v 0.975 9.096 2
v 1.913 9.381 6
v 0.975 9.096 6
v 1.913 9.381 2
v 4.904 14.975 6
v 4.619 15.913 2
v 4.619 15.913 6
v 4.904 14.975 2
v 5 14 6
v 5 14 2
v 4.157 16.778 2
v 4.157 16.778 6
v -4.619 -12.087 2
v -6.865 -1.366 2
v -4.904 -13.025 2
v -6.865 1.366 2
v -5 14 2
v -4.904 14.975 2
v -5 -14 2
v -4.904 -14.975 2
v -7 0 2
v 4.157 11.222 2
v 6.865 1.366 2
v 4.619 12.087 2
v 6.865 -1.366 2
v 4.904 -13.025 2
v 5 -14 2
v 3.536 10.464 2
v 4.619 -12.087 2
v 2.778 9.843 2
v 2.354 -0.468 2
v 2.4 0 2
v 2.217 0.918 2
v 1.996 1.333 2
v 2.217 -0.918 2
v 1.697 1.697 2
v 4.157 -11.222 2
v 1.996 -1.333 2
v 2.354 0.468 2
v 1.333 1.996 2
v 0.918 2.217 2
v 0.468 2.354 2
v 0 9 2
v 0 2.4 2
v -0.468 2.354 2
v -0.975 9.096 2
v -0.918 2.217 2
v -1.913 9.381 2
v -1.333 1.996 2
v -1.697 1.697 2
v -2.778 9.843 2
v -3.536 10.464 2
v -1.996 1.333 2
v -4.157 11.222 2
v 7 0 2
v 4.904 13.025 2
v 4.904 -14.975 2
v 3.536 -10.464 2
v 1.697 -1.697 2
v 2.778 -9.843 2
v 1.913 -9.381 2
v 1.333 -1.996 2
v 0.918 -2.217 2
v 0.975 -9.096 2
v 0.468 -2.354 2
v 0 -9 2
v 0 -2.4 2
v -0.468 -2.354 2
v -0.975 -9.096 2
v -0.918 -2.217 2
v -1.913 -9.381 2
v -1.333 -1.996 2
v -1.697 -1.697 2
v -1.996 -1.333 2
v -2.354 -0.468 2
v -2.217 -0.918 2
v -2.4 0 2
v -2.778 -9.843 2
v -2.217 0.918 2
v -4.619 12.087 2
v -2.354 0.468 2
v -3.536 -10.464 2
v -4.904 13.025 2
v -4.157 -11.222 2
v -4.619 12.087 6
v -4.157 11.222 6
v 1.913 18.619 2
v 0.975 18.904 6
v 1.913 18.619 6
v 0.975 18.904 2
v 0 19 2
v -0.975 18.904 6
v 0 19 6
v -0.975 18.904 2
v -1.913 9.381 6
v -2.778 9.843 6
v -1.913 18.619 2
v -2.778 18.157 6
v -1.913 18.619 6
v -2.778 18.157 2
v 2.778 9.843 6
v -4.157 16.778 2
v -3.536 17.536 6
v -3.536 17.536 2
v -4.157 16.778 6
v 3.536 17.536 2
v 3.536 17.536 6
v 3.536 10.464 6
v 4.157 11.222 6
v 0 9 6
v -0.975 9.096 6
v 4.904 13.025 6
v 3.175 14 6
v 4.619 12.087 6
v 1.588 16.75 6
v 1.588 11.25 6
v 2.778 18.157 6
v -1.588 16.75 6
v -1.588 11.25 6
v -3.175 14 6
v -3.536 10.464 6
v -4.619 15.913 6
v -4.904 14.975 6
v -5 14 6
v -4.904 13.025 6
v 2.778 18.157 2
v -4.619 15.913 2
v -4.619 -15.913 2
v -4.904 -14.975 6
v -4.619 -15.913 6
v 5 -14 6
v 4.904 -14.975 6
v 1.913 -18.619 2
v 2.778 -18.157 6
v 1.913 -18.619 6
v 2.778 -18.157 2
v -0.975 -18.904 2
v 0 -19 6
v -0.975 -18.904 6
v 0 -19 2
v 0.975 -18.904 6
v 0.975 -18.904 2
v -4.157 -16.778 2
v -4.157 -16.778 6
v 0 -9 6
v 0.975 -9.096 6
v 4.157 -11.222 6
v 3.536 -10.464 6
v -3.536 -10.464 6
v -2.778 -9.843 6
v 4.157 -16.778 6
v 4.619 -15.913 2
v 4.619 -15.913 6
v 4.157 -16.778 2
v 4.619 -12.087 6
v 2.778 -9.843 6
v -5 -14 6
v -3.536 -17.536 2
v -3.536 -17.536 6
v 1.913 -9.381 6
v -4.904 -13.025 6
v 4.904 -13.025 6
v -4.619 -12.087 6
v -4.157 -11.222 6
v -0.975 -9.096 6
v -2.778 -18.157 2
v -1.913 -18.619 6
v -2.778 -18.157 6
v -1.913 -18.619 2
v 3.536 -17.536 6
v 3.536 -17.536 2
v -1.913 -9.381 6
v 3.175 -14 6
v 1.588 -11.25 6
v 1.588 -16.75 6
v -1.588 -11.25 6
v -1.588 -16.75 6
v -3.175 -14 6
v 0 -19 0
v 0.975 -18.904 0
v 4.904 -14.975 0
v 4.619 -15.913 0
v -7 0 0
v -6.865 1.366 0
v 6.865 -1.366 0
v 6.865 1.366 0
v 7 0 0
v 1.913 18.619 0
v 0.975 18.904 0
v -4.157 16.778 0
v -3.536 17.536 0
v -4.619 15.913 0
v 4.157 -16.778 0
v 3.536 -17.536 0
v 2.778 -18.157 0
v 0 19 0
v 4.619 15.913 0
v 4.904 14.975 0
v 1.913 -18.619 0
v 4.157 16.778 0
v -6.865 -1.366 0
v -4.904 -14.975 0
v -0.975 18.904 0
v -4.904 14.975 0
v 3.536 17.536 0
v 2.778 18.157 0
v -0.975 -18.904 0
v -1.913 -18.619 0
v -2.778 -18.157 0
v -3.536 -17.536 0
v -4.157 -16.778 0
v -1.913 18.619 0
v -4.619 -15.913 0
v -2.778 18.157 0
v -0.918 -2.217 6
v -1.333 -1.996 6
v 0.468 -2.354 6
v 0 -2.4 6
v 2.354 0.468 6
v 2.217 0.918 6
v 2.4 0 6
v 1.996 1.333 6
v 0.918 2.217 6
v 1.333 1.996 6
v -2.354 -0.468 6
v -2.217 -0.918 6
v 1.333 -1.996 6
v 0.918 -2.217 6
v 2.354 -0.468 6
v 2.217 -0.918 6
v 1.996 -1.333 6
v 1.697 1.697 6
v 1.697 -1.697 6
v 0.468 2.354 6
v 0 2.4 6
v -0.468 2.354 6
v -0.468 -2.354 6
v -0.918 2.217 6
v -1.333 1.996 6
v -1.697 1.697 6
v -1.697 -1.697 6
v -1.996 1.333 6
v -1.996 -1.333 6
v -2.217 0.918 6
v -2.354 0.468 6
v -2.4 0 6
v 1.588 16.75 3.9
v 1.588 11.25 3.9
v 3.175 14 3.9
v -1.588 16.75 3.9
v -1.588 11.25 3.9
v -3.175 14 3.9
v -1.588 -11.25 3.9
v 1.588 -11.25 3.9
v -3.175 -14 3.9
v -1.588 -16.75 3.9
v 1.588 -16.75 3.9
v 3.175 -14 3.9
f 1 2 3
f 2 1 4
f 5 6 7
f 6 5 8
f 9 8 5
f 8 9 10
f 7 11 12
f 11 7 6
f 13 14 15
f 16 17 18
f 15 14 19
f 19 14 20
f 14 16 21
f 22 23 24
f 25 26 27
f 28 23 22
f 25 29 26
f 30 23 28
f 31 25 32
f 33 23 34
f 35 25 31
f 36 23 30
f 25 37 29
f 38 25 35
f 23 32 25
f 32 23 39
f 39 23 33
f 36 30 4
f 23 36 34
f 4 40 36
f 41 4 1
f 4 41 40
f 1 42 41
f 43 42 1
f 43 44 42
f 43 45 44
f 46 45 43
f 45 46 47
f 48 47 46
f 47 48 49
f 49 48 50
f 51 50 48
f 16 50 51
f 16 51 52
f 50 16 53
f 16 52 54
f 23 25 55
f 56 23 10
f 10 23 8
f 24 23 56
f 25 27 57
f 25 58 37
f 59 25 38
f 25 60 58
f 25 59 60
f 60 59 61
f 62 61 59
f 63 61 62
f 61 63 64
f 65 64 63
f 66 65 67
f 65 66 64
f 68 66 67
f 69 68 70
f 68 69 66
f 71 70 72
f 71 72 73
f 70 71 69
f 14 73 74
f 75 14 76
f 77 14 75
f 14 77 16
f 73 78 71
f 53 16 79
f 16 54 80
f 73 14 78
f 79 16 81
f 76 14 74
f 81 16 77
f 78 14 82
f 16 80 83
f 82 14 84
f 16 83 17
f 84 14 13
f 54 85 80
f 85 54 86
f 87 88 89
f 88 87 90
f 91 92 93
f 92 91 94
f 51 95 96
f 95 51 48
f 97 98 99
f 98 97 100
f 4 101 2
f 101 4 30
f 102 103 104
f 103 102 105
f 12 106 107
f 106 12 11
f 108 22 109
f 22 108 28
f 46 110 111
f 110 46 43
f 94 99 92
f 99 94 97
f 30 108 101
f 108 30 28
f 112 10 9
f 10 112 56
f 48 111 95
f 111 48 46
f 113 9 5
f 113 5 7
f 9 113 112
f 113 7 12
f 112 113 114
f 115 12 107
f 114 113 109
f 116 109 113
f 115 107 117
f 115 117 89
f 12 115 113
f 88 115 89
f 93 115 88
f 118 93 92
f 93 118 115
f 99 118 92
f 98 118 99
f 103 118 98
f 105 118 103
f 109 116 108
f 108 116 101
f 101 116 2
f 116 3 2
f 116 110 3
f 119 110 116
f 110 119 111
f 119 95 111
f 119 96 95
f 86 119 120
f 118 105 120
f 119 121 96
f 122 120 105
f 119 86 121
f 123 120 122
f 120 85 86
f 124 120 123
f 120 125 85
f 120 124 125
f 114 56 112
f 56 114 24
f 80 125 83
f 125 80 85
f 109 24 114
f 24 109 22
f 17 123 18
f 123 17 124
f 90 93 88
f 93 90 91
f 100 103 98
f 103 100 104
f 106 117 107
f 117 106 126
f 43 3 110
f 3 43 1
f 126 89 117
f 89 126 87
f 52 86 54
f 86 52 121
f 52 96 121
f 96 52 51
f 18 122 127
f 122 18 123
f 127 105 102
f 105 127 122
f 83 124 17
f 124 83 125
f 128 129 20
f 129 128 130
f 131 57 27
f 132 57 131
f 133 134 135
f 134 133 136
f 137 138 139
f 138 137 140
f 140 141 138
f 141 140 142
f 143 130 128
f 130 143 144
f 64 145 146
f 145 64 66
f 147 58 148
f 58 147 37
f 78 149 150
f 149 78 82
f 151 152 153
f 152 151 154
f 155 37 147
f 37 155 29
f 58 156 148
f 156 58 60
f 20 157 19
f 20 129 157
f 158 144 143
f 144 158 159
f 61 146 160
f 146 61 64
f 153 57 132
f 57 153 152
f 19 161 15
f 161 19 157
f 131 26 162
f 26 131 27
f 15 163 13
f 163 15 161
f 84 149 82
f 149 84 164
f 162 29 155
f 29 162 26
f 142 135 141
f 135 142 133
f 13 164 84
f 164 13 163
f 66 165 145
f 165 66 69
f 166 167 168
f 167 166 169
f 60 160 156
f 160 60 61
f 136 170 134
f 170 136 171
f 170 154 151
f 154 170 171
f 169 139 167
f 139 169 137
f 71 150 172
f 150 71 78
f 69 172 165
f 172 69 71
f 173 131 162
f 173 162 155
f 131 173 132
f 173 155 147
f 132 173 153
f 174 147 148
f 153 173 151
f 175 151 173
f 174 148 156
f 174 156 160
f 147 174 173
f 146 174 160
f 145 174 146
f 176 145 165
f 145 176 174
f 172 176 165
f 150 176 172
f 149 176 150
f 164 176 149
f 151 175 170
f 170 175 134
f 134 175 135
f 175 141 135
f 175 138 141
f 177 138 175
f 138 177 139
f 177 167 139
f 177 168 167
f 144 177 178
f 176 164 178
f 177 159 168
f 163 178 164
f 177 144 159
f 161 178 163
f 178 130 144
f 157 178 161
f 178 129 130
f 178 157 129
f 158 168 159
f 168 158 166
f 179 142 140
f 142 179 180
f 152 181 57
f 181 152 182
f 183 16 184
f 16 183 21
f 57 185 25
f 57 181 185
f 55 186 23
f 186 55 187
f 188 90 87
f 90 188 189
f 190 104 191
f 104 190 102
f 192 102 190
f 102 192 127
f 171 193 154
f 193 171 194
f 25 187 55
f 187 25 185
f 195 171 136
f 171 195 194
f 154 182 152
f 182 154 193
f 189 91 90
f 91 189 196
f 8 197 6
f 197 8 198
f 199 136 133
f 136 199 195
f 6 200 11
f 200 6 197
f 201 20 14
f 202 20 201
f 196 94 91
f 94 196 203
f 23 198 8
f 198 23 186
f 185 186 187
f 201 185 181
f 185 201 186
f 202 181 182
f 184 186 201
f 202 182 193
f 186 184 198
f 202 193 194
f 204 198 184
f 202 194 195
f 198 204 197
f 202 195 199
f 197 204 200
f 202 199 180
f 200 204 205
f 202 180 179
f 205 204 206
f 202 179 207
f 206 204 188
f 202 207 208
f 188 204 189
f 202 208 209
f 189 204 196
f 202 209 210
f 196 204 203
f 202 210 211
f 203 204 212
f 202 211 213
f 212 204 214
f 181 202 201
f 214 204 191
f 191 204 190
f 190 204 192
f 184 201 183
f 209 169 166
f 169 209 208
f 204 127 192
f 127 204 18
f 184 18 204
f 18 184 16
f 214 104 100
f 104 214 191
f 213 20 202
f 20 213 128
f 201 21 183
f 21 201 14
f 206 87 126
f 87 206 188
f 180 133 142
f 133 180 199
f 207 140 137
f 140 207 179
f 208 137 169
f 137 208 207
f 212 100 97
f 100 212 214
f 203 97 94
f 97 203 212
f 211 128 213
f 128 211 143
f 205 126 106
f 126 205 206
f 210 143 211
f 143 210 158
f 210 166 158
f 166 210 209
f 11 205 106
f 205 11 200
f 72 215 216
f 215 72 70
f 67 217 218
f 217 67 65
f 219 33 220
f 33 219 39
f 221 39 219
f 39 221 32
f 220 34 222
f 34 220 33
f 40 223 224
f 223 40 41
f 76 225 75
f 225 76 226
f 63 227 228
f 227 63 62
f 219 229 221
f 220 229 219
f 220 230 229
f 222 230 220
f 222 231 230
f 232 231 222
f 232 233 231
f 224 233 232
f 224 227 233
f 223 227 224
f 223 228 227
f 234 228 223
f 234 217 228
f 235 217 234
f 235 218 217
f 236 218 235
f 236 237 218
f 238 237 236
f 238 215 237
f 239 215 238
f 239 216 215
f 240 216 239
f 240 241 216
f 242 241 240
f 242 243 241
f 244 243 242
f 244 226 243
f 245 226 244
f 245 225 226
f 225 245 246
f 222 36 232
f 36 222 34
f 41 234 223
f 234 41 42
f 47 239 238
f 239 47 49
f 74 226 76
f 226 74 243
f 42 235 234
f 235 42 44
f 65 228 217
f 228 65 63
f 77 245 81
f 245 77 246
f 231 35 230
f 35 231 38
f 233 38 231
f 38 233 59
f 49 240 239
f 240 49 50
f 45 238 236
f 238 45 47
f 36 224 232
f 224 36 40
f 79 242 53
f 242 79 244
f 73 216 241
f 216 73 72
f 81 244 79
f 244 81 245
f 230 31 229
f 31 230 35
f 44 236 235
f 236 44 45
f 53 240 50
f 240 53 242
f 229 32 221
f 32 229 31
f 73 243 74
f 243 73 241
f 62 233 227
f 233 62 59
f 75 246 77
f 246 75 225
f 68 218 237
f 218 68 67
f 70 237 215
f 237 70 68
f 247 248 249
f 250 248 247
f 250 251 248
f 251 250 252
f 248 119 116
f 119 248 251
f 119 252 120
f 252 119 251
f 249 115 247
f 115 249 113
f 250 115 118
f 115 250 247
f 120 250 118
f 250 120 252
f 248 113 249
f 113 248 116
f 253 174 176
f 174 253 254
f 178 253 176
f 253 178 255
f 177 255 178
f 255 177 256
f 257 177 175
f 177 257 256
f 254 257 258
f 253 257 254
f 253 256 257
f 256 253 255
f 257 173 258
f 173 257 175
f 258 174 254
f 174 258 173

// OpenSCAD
// file: oem/generic/third_party/shortcuts.scad
// ShortCuts.scad 
// Autor: Rudolf Huttary, Berlin 2015
//
$fn = 100; 


//show_examples(); 

module show_examples()
	place_in_rect(30, 30)
	{
		Cy(h = 10); 
		CyH(h = 10); 
		CyH(h = 10, w = 30); 
		CyS(h = 10); 
		CyS(h = 10, w1 = 25, w2 = 75); 
		Cu(10); 
		Ri(h = 10); 
		RiH(h = 10); 
		RiS(h = 10, w1 = 10); 
		RiS(h = 10, w1 = 30, w2 = 300); 
		Sp(); 
		SpH(10, 30, 30); 
	}



module help()
{
echo("==============="); 
echo("help(): shows this help"); 
echo("show_examples(): shows some examples"); 
echo("place_in_rect(): places children objects in grid"); 
echo("Transformations:"); 
echo(" transform :  T(x=0, y=0, z=0), Tx(x=0) , Ty(y=0), Tz(z=0)"); 
echo(" rotate :  R(x=0, y=0, z=0), Rx(x=0) , Ry(y=0), Rz(z=0)"); 
echo(" scale :  S(x=1, y=1, z=1), Sx(x=1) , Sy(y=1), Sz(z=1)"); 
echo("Logical"); 
echo(" difference :  D()"); 
echo(" union :  U()"); 
echo(" intersection : *missing*"); 
echo("Primitives"); 
echo(" circle :  Ci(r=10)"); 
echo(" circle_half :  CiH(r=10, w=0)")
echo(" circle_segment :  CiS(r=10, w1=0, w2=90)")
echo(" square :  Sq(x=10, y=0, center=true))"); 
echo(" cylinder :  Cy(r=10, h=1, center=true)"); 
echo(" cylinder_half :  CyH(r=10, w=0)")
echo(" cylinder_segment: CyS(r=10, h=1, w1=0, w2=90,center=true)"); 
echo(" cylinder_segment: Pie(r=10, h=1, w1=0, w2=90,center=true)"); 
echo(" cube :  Cu(x=10, y=0, z=10, center=true)"); 
echo(" ring :  Ri(R=10, r=5, h=1, center=true)"); 
echo(" ring_half :  RiH(R=10, r=5, h=1, w=0 center=true)"); 
echo(" ring_segment :  RiS(R=10, r=5, h=1, w1=0, w2=90, center=true)"); 
echo(" sphere:  Sp(r=10))"); 
echo(" sphere_half:  SpH(r=10, w1 = 0, w2 = 0))"); 
echo("==============="); 
}


// Euclidean Transformations

module T(x=0, y=0, z=0){translate([x, y, z])children(); }
module Tx(x) { translate([x, 0, 0])children(); }
module Ty(y) { translate([0, y, 0])children(); }
module Tz(z) { translate([0, 0, z])children(); }


module R(x=0, y=0, z=0){rotate([x, y, z]) children();}
module Rx(x=90){rotate([x, 0, 0]) children();}
module Ry(y=90){rotate([0, y, 0]) children();}
module Rz(z=90){rotate([0, 0, z]) children();}

module S(x=1, y=1, z=1){scale([x, y, z]) children();}
module Sx(x=1){scale([x, 1, 1]) children();}
module Sy(y=1){scale([1, y, 1]) children();}
module Sz(z=1){scale([1, 1, z]) children();}


module D() difference(){children(0); children([1:$children-1]);}
module U() children([0:$children-1]);
// module I() intersection()children([0:$children-1]); // does not work for some reason


// primitives - 2D

module Sq(x =10, y = 0, center = true)
{
   if(y==0)
		square([x, x], center = center); 
	else
		square([x, y], center = center); 
}
module Ci(r = 10)
{
	circle(r = r); 
}

// derived primitives - 2d
module CiH(r = 10, w = 0)
  circle_half(r, w); 

module CiS(r = 10, w1 = 0, w2 = 90)
  circle_segment(r, w1, w2); 


// primitives - 3d
module Cy(r = 10, h = 1, center = true)
{
	cylinder(r = r, h = h, center = center); 
}
module Cu(x = 10, y = 0, z = 10, center = true)
{
  if (y==0)
	cube([x, x, x], center = center); 
  else
	cube([x, y, z], center = center); 
}

// derived primitives - 3d
module CyH(r = 10, h = 1, w = 0, center = true)
  cylinder_half(r, h, w, center); 

module CyS(r = 10, h = 1, w1 = 0, w2 = 90, center = true)
  cylinder_segment(r, h, w1, w2, center); 

module Ri(R = 10, r = 5, h = 1, center = true)
  ring(R, r, h, center); 

module RiS(R = 10, r = 5, h = 1, w1 = 0, w2 = 90, center = true)
   ring_segment(R, r, h, w1, w2, center); 

module RiH(r1 = 10, r2, h = 1, w = 0, center = true)
   ring_half(r1, r2, h, w, center); 
module Pie(r = 10, h = 1, w1 = 0, w2 = 90, center = true)
  cylinder_segment(r, h, w1, w2, center);  
module Sp(r = 10)
  sphere(r); 
module SpH(r = 10, w1 = 0, w2 = 0)
  sphere_half(r, w1, w2); 
module SpS(r = 10, w1 = 0, w2 = 90, w3 = 90)
  sphere_segment(r, w1, w2); 




// clear text definitions
module circle_half(r = 10, w = 0)
{
	difference()
	{
		circle(r); 
     rotate([0, 0, w-90])
     translate([0, -r])
		square([r, 2*r], center = false); 
	}
}

module circle_segment(r = 10, w1 = 0, w2 = 90)
{
  W2 = (w1>w2)?w2+360:w2; 
  if (W2-w1 < 180)
    intersection()
		{
       circle_half(r, w1); 
       circle_half(r, W2-180); 
 		}
	else
    union()
		{
       circle_half(r, w1); 
       circle_half(r, W2-180); 
 		}
}

module cylinder_half(r = 10, h = 1, w = 0, center = true)
{
  linear_extrude(height = h, center = center)
  circle_half(r, w); 
} 

module cylinder_segment(r = 10, h = 1, w1 = 0, w2 = 90, center = true)
{
  linear_extrude(height = h, center = center)
  circle_segment(r, w1, w2); 
} 

module ring(R = 10, r = 5, h = 1, center = true)
{
	difference()
	{
	cylinder(r = R, h = h, center = center); 
   translate([0, 0, -2*h])
	cylinder(r = r, h = 4*h, center = false); 
	}
}

module ring_half(R = 10, r = 5, h = 1, w = 0, center = true)
{
	difference()
	{
		ring(R, r, h, center); 
     rotate([0, 0, w])
     translate([0, -R/2, 0])
		cube([2*R, R, 3*h], center = true); 
	}
}

module ring_segment(R = 10, r = 5, h = 1, w1 = 0, w2 = 90, center = true)
{
  W2 = (w1>w2)?w2+360:w2; 
  if (W2-w1 < 180)
    intersection()
		{
       ring_half(R, r, h, w1, center); 
       ring_half(R, r, h, W2-180, center); 
 		}
	else
    union()
		{
       ring_half(R, r, h, w1, center); 
       ring_half(R, r, h, W2-180, center); 
 		}
}


module sphere_half(r = 10, w1 = 0, w2 = 0)
{  
	difference()
	{
   	sphere(r); 
      rotate([-w1, -w2, 0])
     	translate([0, 0, r])
		cube(2*r, 2*r, r, center = true); 
	}

}


// additional code
module place_in_rect(dx =20, dy=20)
{
  cols = ceil(sqrt($children)); 
  rows = floor(sqrt($children)); 
  for(i = [0:$children-1])
	{ 
	  T(dx*(-cols/2+(i%cols)+.5), dy*(rows/2-floor(i/cols)-.5))
		 children(i); 
	}
}
// file: oem/m3_hex_standoff.scad
include <generic/lib.scad>;

use <generic/standoffs.scad>;

function vM3x30mmHexThreadedStandoffDatasheet() =
     pvMetricHexStandoffDatasheet(hole_diameter=3, thread_pitch=0.5, length=30, width=5.5);

module mM3x30mmHexThreadedStandoff() {
     color("darkgoldenrod") render() pmMetricHexStandoff(datasheet=vM3x30mmHexThreadedStandoffDatasheet());
}

function vM3x30mmHexStandoffDatasheet() =
     pvMetricHexStandoffDatasheet(hole_diameter=3, length=30, width=5.5);

module mM3x30mmHexStandoff() {
     color("darkgoldenrod") render() pmMetricHexStandoff(datasheet=vM3x30mmHexStandoffDatasheet());
}


function vM3x40mmHexThreadedStandoffDatasheet() =
     pvMetricHexStandoffDatasheet(hole_diameter=3, thread_pitch=0.5, length=40, width=5.5);

module mM3x40mmHexThreadedStandoff() {
     color("darkgoldenrod") render() pmMetricHexStandoff(datasheet=vM3x40mmHexThreadedStandoffDatasheet());
}

function vM3x40mmHexStandoffDatasheet() =
     pvMetricHexStandoffDatasheet(hole_diameter=3, length=40, width=5.5);

module mM3x40mmHexStandoff() {
     color("darkgoldenrod") render() pmMetricHexStandoff(datasheet=vM3x40mmHexStandoffDatasheet());
}


function vM3x15mmHexThreadedStandoffDatasheet() =
     pvMetricHexStandoffDatasheet(hole_diameter=3, thread_pitch=0.5, length=15, width=5.5);

module mM3x15mmHexThreadedStandoff() {
     color("darkgoldenrod") render() pmMetricHexStandoff(datasheet=vM3x15mmHexThreadedStandoffDatasheet());
}

function vM3x15mmHexStandoffDatasheet() =
     pvMetricHexStandoffDatasheet(hole_diameter=3, length=15, width=5.5);

module mM3x15mmHexStandoff() {
     color("darkgoldenrod") render() pmMetricHexStandoff(datasheet=vM3x15mmHexStandoffDatasheet());
}

function vM3x10mmHexThreadedStandoffDatasheet() =
     pvMetricHexStandoffDatasheet(hole_diameter=3, thread_pitch=0.5, length=10, width=5.5);

module mM3x10mmHexThreadedStandoff() {
     color("darkgoldenrod") render() pmMetricHexStandoff(datasheet=vM3x10mmHexThreadedStandoffDatasheet());
}

function vM3x10mmHexStandoffDatasheet() =
     pvMetricHexStandoffDatasheet(hole_diameter=3, length=10, width=5.5);

module mM3x10mmHexStandoff() {
     color("darkgoldenrod") render() pmMetricHexStandoff(datasheet=vM3x10mmHexStandoffDatasheet());
}
// file: generic/ball_caster_support.scad
include <lib.scad>;

use <ball_caster_yoke.scad>;

function pvBallCasterSupportDatasheet(ball_diameter, ball_protrusion, ball_gap,
                                      wall_gap, wall_thickness, base_thickness,
                                      mount_offset, mount_diameter) =
     assert(ball_diameter > 0)
     assert(ball_protrusion > 0)
     assert(ball_diameter > ball_protrusion)
     assert(ball_gap > 0)
     assert(wall_gap > 0)
     assert(ball_diameter > 2 * wall_gap)
     assert(wall_thickness > 0)
     assert(base_thickness > 0)
     assert(mount_offset > ball_diameter/2)
     assert(mount_diameter > 0)
     [["ball_diameter", ball_diameter], ["ball_protrusion", ball_protrusion], ["ball_gap", ball_gap],
      ["wall_gap", wall_gap], ["wall_thickness", wall_thickness], ["base_thickness", base_thickness],
      ["mount_offset", mount_offset], ["mount_diameter", mount_diameter],
      ["ball_z_offset", base_thickness + ball_gap + ball_diameter / 2],
      ["main_height", base_thickness + ball_gap + ball_diameter - ball_protrusion],
      ["main_diameter", ball_diameter + 2 * wall_thickness]];

module pmBallCasterSupport(datasheet) {
     base_thickness = property(datasheet, "base_thickness");
     main_height = property(datasheet, "main_height");
     main_diameter = property(datasheet, "main_diameter");
     mount_offset = property(datasheet, "mount_offset");
     mount_diameter = property(datasheet, "mount_diameter");
     ball_diameter = property(datasheet, "ball_diameter");
     ball_protrusion = property(datasheet, "ball_protrusion");
     ball_gap = property(datasheet, "ball_gap");
     ball_z_offset = property(datasheet, "ball_z_offset");
     wall_gap = property(datasheet, "wall_gap");
     wall_thickness = property(datasheet, "wall_thickness");

     pmBallCasterYoke(datasheet);
     rotate([0, 0, 90]) {
          translate([0, 0, base_thickness]) {
               difference() {
                    cylinder(h=main_height - base_thickness, d=main_diameter);
                    translate([0, 0, ball_z_offset - base_thickness]) sphere(d=ball_diameter);
                    translate([-main_diameter / 2 - kEpsilon, -wall_gap / 2, 0]) {
                         cube([main_diameter + 2 * kEpsilon, wall_gap, main_height - base_thickness + kEpsilon]);
                    }
                    translate([-main_diameter/2 - kEpsilon, 0, main_height - base_thickness - wall_gap/2]) {
                         rotate([0, 90, 0]) cylinder(h=main_diameter + 2 * kEpsilon, d=2 * wall_gap, $fn=6);
                    }
                    cylinder(h=ball_diameter/4 + ball_gap, d=ball_diameter * sqrt(3)/2);
               }
          }
     }
}

pmBallCasterSupport(
     datasheet=pvBallCasterSupportDatasheet(
          ball_diameter=10, ball_protrusion=3, ball_gap=2,
          wall_gap=3, wall_thickness=2, base_thickness=2,
          mount_offset=10, mount_diameter=4
     )
);
// file: oem/generic/standoffs.scad
include <lib.scad>;

use <third_party/threads.scad>;

function pvMetricHexStandoffDatasheet(length, width, hole_diameter=0, thread_pitch=0) =
     assert(length > 0)
     assert(width > 0)
     assert(hole_diameter >= 0)
     assert(width > hole_diameter)
     assert(thread_pitch >= 0)
     [["length", length], ["width", width], ["hole_diameter", hole_diameter], ["thread_pitch", thread_pitch]];


module pmMetricHexStandoff(datasheet) {
     width = property(datasheet, "width");
     length = property(datasheet, "length");
     hole_diameter = property(datasheet, "hole_diameter");
     thread_pitch = property(datasheet, "thread_pitch");
     difference() {
          cylinder(d=width / cos(30), h=length, $fn=6);
          translate([0, 0, -length/2]) {
               if (hole_diameter > 0) {
                    if (thread_pitch > 0) {
                         metric_thread(diameter=hole_diameter, pitch=thread_pitch,
                                       length=2 * length, internal=true);
                    } else {
                         cylinder(d=hole_diameter, h=2 * length);
                    }
               }
          }
     }
}

pmMetricHexStandoff(
     datasheet=pvMetricHexStandoffDatasheet(
          length=20, width=5, hole_diameter=3, thread_pitch=1
     )
);
// file: oem/generic/third_party/springs.scad
include <shortcuts.scad>  // http://www.thingiverse.com/thing:644830
$fn = 100;
help();
//examples();  // slow!! F6 takes hours!
module examples()
{
place_in_rect(60, 60)
{
// examples spring:
	spring(Windings = 7, R = 10, r = 1, h = 20);  // clockwise
	R(90) spring(Windings = 3, R = 12, r = 2, h = -60); // ccw

// examples helicoils:
	helicoil(Windings = 10);  // square wire
	helicoil(clockwise = false, square = true);  // ccw + round wire

// examples elliptic rings:
	elliptic_ring(10, 5, 1);
	elliptic_ring(10, 10, 1);  // non elliptic
	elliptic_ring(h = 10);  // element of a spring
	elliptic_ring(h = 10, w = 240);  // partial ring

// example chain:
	U()
	{
	 Rx(90) T(15) elliptic_ring(); 
	 elliptic_ring(); 
	 Rx(90) T(-15) elliptic_ring(); 
	}
}
}

module help()
{
	echo("===== springs.scad - signatures [by Rudolf Huttary, Berlin] ===="); 
	echo("elliptic_ring(r1 = 10, r2 = 5, r = 2, slices = 100, h = 0, w = 360)
"); 
	echo("helicoil(Windings = 5, R = 20, r = 1, slices = 50, clockwise = true, square = true)"); 
	echo("spring(Windings = 5, R = 20, r=2, h = 20, slices = 50)"); 
	echo("elliptic_spring(Windings = 5, R1 = 20, R2 = 0, r=1, h = 20, slices = 50)"); 
	echo("===== springs.scad - end ===="); 
}


module elliptic_ring(r1 = 10, r2 = 5, r = 2, slices = 100, h = 0, w = 360)
{
	dz = h/slices; 
   dwx = atan(h/(r1+r2)/PI); 
	for (i = [0:slices-1])
	hull()
	{
		T(r1*cos((i+1)*w/slices), r2*sin((i+1)*w/slices), (i+1)*dz)
	   R(90+dwx, 0, (i+1)*w/slices)
		Cy(r = r, h = .01); 
	
		T(r1*cos((i)*w/slices), r2*sin((i)*w/slices), i*dz)
	   R(90+dwx, 0, i*w/slices)
		Cy(r = r, h = .01); 
	}
}

module helicoil(Windings = 5, R = 20, r = 1, slices = 50, clockwise = true, square = true)
{
  $fn = square? 4 :$fn; 
  h = clockwise?Windings*2*r:-Windings*2*r; 
  spring(Windings, R, r, h, slices); 
  T((.5*R)/2, r)
  Ry(90 )
  Cy(r, 1.5*R); 
}

module spring(Windings = 5, R = 20, r=2, h = 20, slices = 50)
	elliptic_spring(Windings, R, 0, r, h, slices); 

module elliptic_spring(Windings = 5, R1 = 20, R2 = 0, r=1, h = 20, slices = 50)
{
   dh = h/Windings;   
   r2 = (R2==0)?R1:R2; 
	for(j = [0:Windings-1])
		Tz(j*dh)
		elliptic_ring(R1, r2, r, slices, dh); 
}
// file: oem/generic/lib.scad
$fn = 32;

kEpsilon = 1e-1;

function property(table, key) = table[search([key], table)[0]][1];

module sector(radius, angles, fn = $fn) {
     r = radius / cos(180 / fn);
     step = -360 / fn;

     points = concat([[0, 0]],
                     [for(a = [angles[0] : step : angles[1] - 360])
                               [r * cos(a), r * sin(a)]
                          ],
                     [[r * cos(angles[1]), r * sin(angles[1])]]
          );

     difference() {
          circle(radius, $fn = fn);
          polygon(points);
     }
}

module ring(inner_radius, outer_radius, angles = [0, 360], fn = $fn) {
     difference() {
          sector(radius=outer_radius, angles=angles, fn=fn);
          sector(radius=inner_radius, angles=angles+[-kEpsilon, kEpsilon], fn=fn);
     }
}

module rounded_ring(inner_radius, outer_radius, angles = [0, 360], fn = $fn) {
     step_angle = 360 / fn;
     ring_width = outer_radius - inner_radius;
     ring_mean_radius = (outer_radius + inner_radius) / 2;
     for (theta = angles) {
          theta_d = theta / step_angle;
          theta_frac = (theta_d - floor(theta_d) - 0.5) * step_angle;
          rho = ring_mean_radius * cos(step_angle/2) / cos(theta_frac);
          rotate(theta)
          translate([rho, 0])
          circle(d=ring_width);
     }
     ring(inner_radius=inner_radius,
          outer_radius=outer_radius,
          angles=angles, fn=fn);
}

module fillet(r) {
     difference() {
          difference() {
               offset(r=-r - kEpsilon)
                    offset(delta=r) {
                    children();
               }
               offset(r=r)
                    offset(delta=-r) {
                    children();
               }
          }
          children();
     }
     offset(r=r)
          offset(delta=-r) {
          children();
     }
}

module bench_fillet(r, order=1000) {
     difference() {
          fillet(r) {
               translate([-order/2-kEpsilon, 0]) {
                    square([order, order], center=true);
               }
               children();
          }
          translate([-order/2-kEpsilon, 0]) {
               square([order+kEpsilon, order+kEpsilon], center=true);
          }
     }
}

module curved_bench_fillet(r, bench_radius, order=1000, internal=true) {
     difference() {
          fillet(r) {
               if (internal) {
                    translate([bench_radius, 0]) {
                         ring(inner_radius=bench_radius + kEpsilon, outer_radius=bench_radius * order);
                    }
               } else {
                    translate([-bench_radius, 0]) circle(r=bench_radius - kEpsilon);
               }
               children();
          }
          if (internal) {
               translate([bench_radius, 0]) {
                    ring(inner_radius=bench_radius,
                         outer_radius=bench_radius * order - kEpsilon);
               }
          } else {
               translate([-bench_radius, 0]) circle(r=bench_radius);
          }

     }
}


module window(side, position=[0, 0, 0], order=1000) {
    difference() {
        children();
        translate(position)  {
            difference() {
                square(order, center=true);
                square(side, center=true);
            }
        }
    }
}


module rounded_cylinder(diameter, height, fillet_radius, center) {
     translate([0, 0, ! center ? height/2 : 0]) {
          minkowski() {
               cylinder(d=(diameter - 2 * fillet_radius),
                        h=(height - 2 * fillet_radius),
                        center=true);
               sphere(r=fillet_radius);
          }
     }
}


module curved_support_xsection(support_radius, fillet_radius,
                               wall_inner_radius, wall_outer_radius,
                               hole_radius = 0, internal=true) {
     support_angular_width = (4 * support_radius / wall_outer_radius) * 180 / PI;
     wall_thickness = wall_outer_radius - wall_inner_radius;
     rotate([0, 0, internal ? 180 : 0]) {
          difference() {
               window(6*support_radius) {
                    curved_bench_fillet(fillet_radius, bench_radius=wall_inner_radius, internal=internal) {
                         hull() {
                              translate([support_radius + wall_thickness/2, 0]) {
                                   circle(r=support_radius);
                              }
                              rotate([0, 0, ! internal ? 180 : 0])
                              translate([wall_inner_radius + wall_thickness/2, 0]) {
                                   ring(inner_radius=wall_inner_radius,
                                        outer_radius=wall_outer_radius,
                                        angles=[180 - support_angular_width/2,
                                                180 + support_angular_width/2]);
                              }
                         }
                         rotate([0, 0, ! internal ? 180 : 0])
                         translate([wall_inner_radius + wall_thickness/2, 0]) {
                              ring(inner_radius=wall_inner_radius,
                                   outer_radius=wall_outer_radius,
                                   angles=[180 - support_angular_width,
                                           180 + support_angular_width]);
                         }
                    }
               }
               if (hole_radius > 0) {
                    translate([support_radius + wall_thickness/2, 0]) {
                         circle(r=hole_radius);
                    }
               }
          }
     }
}

module fill(upto=1000) {
     offset(delta=-upto) {
          offset(delta=upto) {
               children();
          }
     }
}

module outline(delta) {
     if (delta > 0) {
          difference() {
               offset(delta=delta) {
                    children();
               }
               children();
          }
     } else {
          difference() {
               children();
               offset(delta=delta) {
                    children();
               }
          }
     }
}

module duplicate(v) {
     children();
     mirror(v) children();
}

function steps(start, end, n) = [start:(end - start)/(n - 1):end];

function sigmoid(x) = 1.0 / (1.0 + exp(-x));

module sigmoid_profile(length, width, order=10, fn = $fn) {
     step = length / fn;
     points = concat(
          [[0, 0]],
          [for (x = [step:step:length-step]) [x, width * sigmoid(2 * order * ((x / length) - 0.5))]],
          [[length, width], [0, width]]

     );
     polygon(points=points);
}

module exp_nerve_xsection(height, length, decay_rate = 5, fn = $fn) {
     step = length / fn;
     points = concat(
          [[0, 0]],
          [for (x = [0:step:length-step]) [x, height * exp(-x/decay_rate)]],
          [[length, 0]]
          );
     polygon(points=points);
}

module exp_nerve(height, length, thickness, decay_rate = 3, fn = $fn) {
     rotate([90, 0, 0])
     linear_extrude(height=thickness, center=true) {
          exp_nerve_xsection(height, length, decay_rate, fn);
     }
}

module exp_corner_nerve(height, radius, angles, corner_radius = 0, decay_rate = 3, fn = $fn) {
     difference() {
          rotate_extrude() {
               if (corner_radius > 0) {
                    translate([corner_radius, 0, 0])
                    exp_nerve_xsection(height=height, length=radius, decay_rate=decay_rate, fn=fn);
               } else {
                    translate([-corner_radius, 0, 0])
                    mirror([1, 0, 0])
                    exp_nerve_xsection(height=height, length=radius, decay_rate=decay_rate, fn=fn);
               }
          }
          linear_extrude(height=2 * height, center=true) {
               sector(radius=radius + abs(corner_radius), angles=[angles[1], angles[0] + 360], fn=fn);
          }
     }
}
// file: 10mm_ball_caster_support.scad
include <generic/lib.scad>;

use <generic/ball_caster_support.scad>;

use <oem/m3_hex_standoff.scad>;

function v10mmBallCasterSupportDatasheet() =
     pvBallCasterSupportDatasheet(ball_diameter=10, ball_protrusion=3, ball_gap=1,
                                  wall_gap=2, wall_thickness=2, base_thickness=2,
                                  mount_offset=14, mount_diameter=10);

module m10mmBallCasterSupport() {
     datasheet = v10mmBallCasterSupportDatasheet();
     base_thickness = property(datasheet, "base_thickness");
     mount_offset = property(datasheet, "mount_offset");

     color($default_color) {
          render() {
               difference() {
                    pmBallCasterSupport(datasheet);
                    translate([0, 0, -kEpsilon]) {
                         duplicate([0, 1, 0]) {
                              translate([0, mount_offset, 0]) {
                                   linear_extrude(height=base_thickness + 2 * kEpsilon) {
                                        hull() projection() mM3x15mmHexStandoff();
                                   }
                              }
                         }
                    }
               }
          }
     }
}

m10mmBallCasterSupport();
// file: oem/m3x15mm_hex_standoff.scad
include <generic/lib.scad>;

use <generic/standoffs.scad>;

function vM3x15mmHexThreadedStandoffDatasheet() =
     pvMetricHexStandoffDatasheet(hole_diameter=3, thread_pitch=0.5, length=15, width=5.5);

module mM3x15mmHexThreadedStandoff() {
     color("darkgoldenrod") render() pmMetricHexStandoff(datasheet=vM3x15mmHexThreadedStandoffDatasheet());
}

function vM3x15mmHexStandoffDatasheet() =
     pvMetricHexStandoffDatasheet(length=15, width=5.5);

module mM3x15mmHexStandoff() {
     color("darkgoldenrod") render() pmMetricHexStandoff(datasheet=vM3x15mmHexStandoffDatasheet());
}
// file: oem/f174_sae1070_spring.scad
include <generic/lib.scad>;

use <generic/third_party/springs.scad>

function vF174SAE1070SpringDatasheet() =
     let(outer_diameter=8.8, wire_diameter=2, n_windings=5.5,
         inner_diameter=outer_diameter - 2 * wire_diameter,
         free_length=15)
     [["outer_diameter", outer_diameter], ["inner_diameter", inner_diameter],
      ["n_windings", n_windings], ["wire_diameter", wire_diameter],
      ["free_length",free_length], ["pitch", free_length/n_windings]];

kF174SAE1070SpringLength = property(vF174SAE1070SpringDatasheet(), "free_length");

module mF174SAE1070Spring(length=kF174SAE1070SpringLength) {
     assert(length > 0);
     assert(length <= kF174SAE1070SpringLength);

     datasheet = vF174SAE1070SpringDatasheet();
     // 'generic/third_party/springs.scad' no maneja vueltas fraccionarias
     n_windings = round(property(datasheet, "n_windings"));
     main_radius = (property(datasheet, "outer_diameter") +
                    property(datasheet, "inner_diameter")) / 4;
     wire_radius = property(datasheet, "wire_diameter") / 2;

     color("silver") {
          render() {
               translate([0, 0, wire_radius]) {
                    spring(Windings=n_windings, R=main_radius, r=wire_radius,
                           h=length - 2 * wire_radius, slices=50);
               }
          }
     }
}

mF174SAE1070Spring();
// file: generic/ball_caster_yoke.scad
include <lib.scad>;

function pvBallCasterYokeDatasheet(main_diameter, base_thickness, mount_offset, mount_diameter, mount_height=0) =
     assert(main_diameter > 0)
     assert(base_thickness > 0)
     assert(mount_offset > 0)
     assert(mount_diameter > 0)
     [["main_diameter", main_diameter], ["base_thickness", base_thickness],
      ["mount_offset", mount_offset], ["mount_diameter", mount_diameter],
      ["mount_height", mount_height], ["main_height", mount_height + base_thickness]];

module pmBallCasterYoke(datasheet) {
     main_diameter = property(datasheet, "main_diameter");
     base_thickness = property(datasheet, "base_thickness");
     mount_offset = property(datasheet, "mount_offset");
     mount_diameter = property(datasheet, "mount_diameter");
     mount_height = property(datasheet, "mount_height");

     linear_extrude(height=base_thickness) {
          hull() {
               circle(d=main_diameter);
               duplicate([0, 1, 0]) {
                    translate([0, mount_offset, 0]) {
                         circle(d=mount_diameter);
                    }
               }
          }
     }
     if (mount_height > 0) {
          translate([0, 0, base_thickness]) {
               duplicate([0, 1, 0]) {
                    translate([0, mount_offset, 0]) {
                         cylinder(h=mount_height, d=mount_diameter);
                    }
               }
          }
     }
}

pmBallCasterYoke(
     datasheet=pvBallCasterYokeDatasheet(
          main_diameter=12, base_thickness=2, mount_offset=10, mount_diameter=4, mount_height=5
     )
);
// main file
include <generic/lib.scad>;

use <generic/ball_caster_yoke.scad>;

use <oem/f174_sae1070_spring.scad>;
use <oem/m3x15mm_hex_standoff.scad>;

use <10mm_ball_caster_support.scad>;

function v10mmBallCasterYokeDatasheet() =
     let(support_datasheet=v10mmBallCasterSupportDatasheet())
     pvBallCasterYokeDatasheet(main_diameter=property(support_datasheet, "main_diameter"),
                               base_thickness=property(support_datasheet, "base_thickness"),
                               mount_offset=property(support_datasheet, "mount_offset"),
                               mount_diameter=property(support_datasheet, "mount_diameter"),
                               mount_height=4);

module m10mmBallCasterYoke() {
     datasheet = v10mmBallCasterYokeDatasheet();
     base_thickness = property(datasheet, "base_thickness");
     mount_offset = property(datasheet, "mount_offset");
     mount_height = property(datasheet, "mount_height");

     color($default_color) {
          render() {
               difference() {
                    union() {
                         pmBallCasterYoke(datasheet);
                         translate([0, 0, base_thickness]) {
                              cylinder(d=property(vF174SAE1070SpringDatasheet(), "inner_diameter"), h=mount_height);
                         }
                    }
                    duplicate([0, 1, 0]) {
                         translate([0, mount_offset, -kEpsilon]) {
                              translate([0, 0, mount_height]) {
                                   linear_extrude(height=base_thickness + 2 * kEpsilon) {
                                        hull() projection() mM3x15mmHexStandoff();
                                   }
                              }
                         }
                    }
               }
          }
     }
}

m10mmBallCasterYoke();
